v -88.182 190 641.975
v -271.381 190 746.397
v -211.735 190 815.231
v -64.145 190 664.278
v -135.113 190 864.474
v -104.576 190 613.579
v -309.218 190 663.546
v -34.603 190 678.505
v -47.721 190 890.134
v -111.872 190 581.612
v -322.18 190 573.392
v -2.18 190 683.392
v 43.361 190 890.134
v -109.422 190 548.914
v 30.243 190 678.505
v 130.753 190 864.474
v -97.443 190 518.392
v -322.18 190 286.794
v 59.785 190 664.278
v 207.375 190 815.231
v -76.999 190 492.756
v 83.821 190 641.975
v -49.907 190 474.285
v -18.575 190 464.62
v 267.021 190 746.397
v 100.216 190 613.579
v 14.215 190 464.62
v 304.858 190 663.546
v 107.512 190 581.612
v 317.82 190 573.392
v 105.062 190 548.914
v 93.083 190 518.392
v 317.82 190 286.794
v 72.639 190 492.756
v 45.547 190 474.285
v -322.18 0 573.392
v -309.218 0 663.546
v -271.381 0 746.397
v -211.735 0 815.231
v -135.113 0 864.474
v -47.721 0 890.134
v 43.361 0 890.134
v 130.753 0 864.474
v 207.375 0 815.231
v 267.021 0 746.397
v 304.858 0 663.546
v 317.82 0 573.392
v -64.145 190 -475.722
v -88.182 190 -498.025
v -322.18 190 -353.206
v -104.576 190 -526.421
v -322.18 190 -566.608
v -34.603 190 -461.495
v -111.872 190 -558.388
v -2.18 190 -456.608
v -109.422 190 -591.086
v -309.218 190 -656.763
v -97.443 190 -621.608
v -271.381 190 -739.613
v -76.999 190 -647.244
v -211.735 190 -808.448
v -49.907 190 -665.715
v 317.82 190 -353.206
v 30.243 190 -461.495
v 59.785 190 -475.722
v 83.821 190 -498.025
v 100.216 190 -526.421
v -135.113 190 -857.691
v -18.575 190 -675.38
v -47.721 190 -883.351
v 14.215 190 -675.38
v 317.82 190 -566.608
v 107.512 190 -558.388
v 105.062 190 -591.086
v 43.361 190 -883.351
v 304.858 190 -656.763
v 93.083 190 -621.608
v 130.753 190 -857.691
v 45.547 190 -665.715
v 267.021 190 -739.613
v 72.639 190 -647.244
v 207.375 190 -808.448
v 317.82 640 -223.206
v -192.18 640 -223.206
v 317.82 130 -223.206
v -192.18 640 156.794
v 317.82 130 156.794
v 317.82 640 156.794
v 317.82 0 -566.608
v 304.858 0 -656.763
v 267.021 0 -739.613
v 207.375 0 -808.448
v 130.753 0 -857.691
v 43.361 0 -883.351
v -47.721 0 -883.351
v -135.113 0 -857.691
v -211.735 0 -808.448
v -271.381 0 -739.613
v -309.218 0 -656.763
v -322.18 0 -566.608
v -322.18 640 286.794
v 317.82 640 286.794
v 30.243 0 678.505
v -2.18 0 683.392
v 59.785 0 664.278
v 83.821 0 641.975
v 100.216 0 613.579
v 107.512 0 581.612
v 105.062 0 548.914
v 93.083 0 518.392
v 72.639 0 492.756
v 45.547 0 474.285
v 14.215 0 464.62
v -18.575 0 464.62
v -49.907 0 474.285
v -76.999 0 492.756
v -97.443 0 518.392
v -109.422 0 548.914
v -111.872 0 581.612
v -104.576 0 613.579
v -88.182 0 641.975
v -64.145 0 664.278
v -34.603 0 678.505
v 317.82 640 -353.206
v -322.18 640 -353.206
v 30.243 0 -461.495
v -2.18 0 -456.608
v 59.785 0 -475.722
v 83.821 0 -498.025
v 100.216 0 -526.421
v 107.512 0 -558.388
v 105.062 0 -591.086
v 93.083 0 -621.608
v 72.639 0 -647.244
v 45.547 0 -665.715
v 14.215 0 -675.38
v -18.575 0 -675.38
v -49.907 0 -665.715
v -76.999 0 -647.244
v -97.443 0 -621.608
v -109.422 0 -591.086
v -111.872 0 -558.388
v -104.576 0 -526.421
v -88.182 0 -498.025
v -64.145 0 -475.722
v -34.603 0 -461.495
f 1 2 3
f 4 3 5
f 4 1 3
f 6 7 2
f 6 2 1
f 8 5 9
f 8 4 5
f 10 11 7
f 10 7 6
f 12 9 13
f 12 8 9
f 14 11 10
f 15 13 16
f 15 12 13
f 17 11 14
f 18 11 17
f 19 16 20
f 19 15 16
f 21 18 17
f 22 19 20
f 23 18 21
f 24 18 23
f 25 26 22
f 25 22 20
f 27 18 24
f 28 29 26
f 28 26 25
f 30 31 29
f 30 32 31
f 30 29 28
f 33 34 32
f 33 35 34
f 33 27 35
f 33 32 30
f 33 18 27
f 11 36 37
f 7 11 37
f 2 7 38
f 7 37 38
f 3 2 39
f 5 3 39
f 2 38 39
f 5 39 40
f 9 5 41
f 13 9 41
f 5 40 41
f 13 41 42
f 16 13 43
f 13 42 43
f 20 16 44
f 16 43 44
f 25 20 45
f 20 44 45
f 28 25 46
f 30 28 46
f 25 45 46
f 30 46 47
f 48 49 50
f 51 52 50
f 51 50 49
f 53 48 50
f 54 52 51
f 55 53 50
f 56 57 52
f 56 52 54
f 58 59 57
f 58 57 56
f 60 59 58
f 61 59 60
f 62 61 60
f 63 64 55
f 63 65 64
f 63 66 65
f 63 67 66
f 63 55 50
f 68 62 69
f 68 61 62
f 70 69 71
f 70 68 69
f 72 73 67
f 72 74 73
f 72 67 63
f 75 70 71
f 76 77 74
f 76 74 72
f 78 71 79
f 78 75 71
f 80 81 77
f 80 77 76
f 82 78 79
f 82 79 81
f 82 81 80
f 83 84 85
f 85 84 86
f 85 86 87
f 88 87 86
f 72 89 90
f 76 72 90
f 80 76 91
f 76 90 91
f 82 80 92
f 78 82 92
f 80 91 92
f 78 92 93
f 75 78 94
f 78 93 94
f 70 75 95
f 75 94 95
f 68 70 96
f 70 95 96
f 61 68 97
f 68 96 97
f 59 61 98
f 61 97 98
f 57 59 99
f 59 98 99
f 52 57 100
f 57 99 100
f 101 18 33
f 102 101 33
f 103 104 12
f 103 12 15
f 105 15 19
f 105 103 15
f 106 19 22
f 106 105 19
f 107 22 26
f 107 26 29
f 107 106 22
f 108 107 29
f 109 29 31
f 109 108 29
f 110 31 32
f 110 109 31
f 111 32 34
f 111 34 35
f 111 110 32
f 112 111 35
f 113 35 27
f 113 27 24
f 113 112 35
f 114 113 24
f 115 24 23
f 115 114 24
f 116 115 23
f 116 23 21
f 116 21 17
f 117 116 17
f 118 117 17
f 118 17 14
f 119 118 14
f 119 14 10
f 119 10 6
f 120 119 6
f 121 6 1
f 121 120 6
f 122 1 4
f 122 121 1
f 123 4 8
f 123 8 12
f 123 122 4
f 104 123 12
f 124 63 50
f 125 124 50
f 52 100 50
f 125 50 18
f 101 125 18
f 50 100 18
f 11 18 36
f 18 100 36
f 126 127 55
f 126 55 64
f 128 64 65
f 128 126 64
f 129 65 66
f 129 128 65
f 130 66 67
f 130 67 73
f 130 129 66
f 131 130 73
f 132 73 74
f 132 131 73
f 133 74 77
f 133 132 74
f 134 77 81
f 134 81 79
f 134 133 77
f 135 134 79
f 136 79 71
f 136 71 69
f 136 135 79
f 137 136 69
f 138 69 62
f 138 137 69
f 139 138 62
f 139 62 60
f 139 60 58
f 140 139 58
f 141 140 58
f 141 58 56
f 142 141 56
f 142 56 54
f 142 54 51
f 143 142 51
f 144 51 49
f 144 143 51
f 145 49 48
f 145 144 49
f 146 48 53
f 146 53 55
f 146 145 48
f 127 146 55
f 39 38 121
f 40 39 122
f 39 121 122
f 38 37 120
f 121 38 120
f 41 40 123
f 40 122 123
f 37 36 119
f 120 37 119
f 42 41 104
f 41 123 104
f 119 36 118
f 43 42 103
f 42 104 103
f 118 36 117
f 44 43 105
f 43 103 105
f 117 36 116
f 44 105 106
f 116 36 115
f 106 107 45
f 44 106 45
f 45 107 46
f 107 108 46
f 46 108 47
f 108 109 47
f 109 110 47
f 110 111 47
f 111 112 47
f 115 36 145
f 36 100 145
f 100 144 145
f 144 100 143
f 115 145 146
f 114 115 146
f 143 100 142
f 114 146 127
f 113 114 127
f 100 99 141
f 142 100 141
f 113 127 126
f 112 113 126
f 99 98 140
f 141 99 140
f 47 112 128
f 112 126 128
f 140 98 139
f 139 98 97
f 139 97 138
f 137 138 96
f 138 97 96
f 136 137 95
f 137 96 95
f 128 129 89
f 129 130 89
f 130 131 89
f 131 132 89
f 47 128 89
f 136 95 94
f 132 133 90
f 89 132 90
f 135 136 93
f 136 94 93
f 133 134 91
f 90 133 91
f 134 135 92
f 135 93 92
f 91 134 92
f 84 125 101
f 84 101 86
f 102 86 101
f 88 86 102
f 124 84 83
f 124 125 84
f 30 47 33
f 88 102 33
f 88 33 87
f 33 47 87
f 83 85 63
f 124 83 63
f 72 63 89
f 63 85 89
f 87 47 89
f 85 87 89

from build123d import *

# Parameters (mm, degrees)
SKETCH2_R             = 110
BOSS_EXTRUDE8_DEPTH   = 190
BOSS_EXTRUDE8_2_DEPTH = 190
BOSS_EXTRUDE9_DEPTH   = 640
SKETCH2_14_W          = 510.000000001
SKETCH2_14_H          = 380
BOSS_EXTRUDE10_DEPTH  = 130
BOSS_EXTRUDE11_REACH  = 1328.721


with BuildPart() as part:
    # Sketch2 → Boss-Extrude8 (new body)
    with BuildSketch(Plane(origin=(0, 0, 0), x_dir=(1, 0, 0), z_dir=(0, 1, 0))):
        with BuildLine():
            ThreePointArc((317.819938748, 566.60839198), (-2.180061253, 886.60839198), (-322.180061253, 566.60839198))
            Line((-322.180061253, 566.60839198), (-322.180061253, 353.205761503))
            Line((-322.180061253, 353.205761503), (317.819938748, 353.205761503))
            Line((317.819938748, 353.205761503), (317.819938748, 566.60839198))
        make_face()
        with Locations((-2.180061253, 566.60839198)):
            Circle(SKETCH2_R, mode=Mode.SUBTRACT)
    extrude(amount=BOSS_EXTRUDE8_DEPTH)



with BuildPart() as body_2:
    # Sketch2 → Boss-Extrude8 2 (new body)
    with BuildSketch(Plane(origin=(0, 0, 0), x_dir=(1, 0, 0), z_dir=(0, 1, 0))):
        with BuildLine():
            Line((317.819938748, -286.794238497), (-322.180061253, -286.794238497))
            Line((-322.180061253, -286.794238497), (-322.180061253, -573.39160802))
            ThreePointArc((-322.180061253, -573.39160802), (-2.180061253, -893.39160802), (317.819938748, -573.39160802))
            Line((317.819938748, -573.39160802), (317.819938748, -286.794238497))
        make_face()
        with Locations((-2.180061253, -573.39160802)):
            Circle(SKETCH2_R, mode=Mode.SUBTRACT)
    extrude(amount=BOSS_EXTRUDE8_2_DEPTH)


with BuildPart() as part_1:
    add(part.part)

    add(body_2.part)  # Boss-Extrude9 merges body 2
    # Sketch2<13> → Boss-Extrude9 (add)
    with BuildSketch(Plane(origin=(0, 0, 0), x_dir=(1, 0, 0), z_dir=(0, 1, 0))):
        Polygon((317.819938748, 353.205761503), (-322.180061253, 353.205761503), (-322.180061253, -286.794238497), (317.819938748, -286.794238497), (317.819938748, -156.794238497), (-192.180061253, -156.794238497), (-192.180061253, 223.205761503), (317.819938748, 223.205761503), align=None)
    extrude(amount=BOSS_EXTRUDE9_DEPTH)

    # Sketch2<14> → Boss-Extrude10 (add)
    with BuildSketch(Plane(origin=(0, 0, 0), x_dir=(1, 0, 0), z_dir=(0, 1, 0))):
        with Locations((62.819938748, 33.205761503)):
            Rectangle(SKETCH2_14_W, SKETCH2_14_H)
    extrude(amount=BOSS_EXTRUDE10_DEPTH)

    # Sketch13 → Boss-Extrude11 (add, up to next)
    with BuildSketch(Plane.XY.offset(-223.205761503), mode=Mode.PRIVATE) as boss_extrude11_sk1:
        Polygon((-192.180061253, 640), (317.819938748, 130), (-192.180061253, 130), align=None)
    boss_extrude11_tool1 = extrude(boss_extrude11_sk1.sketch, amount=BOSS_EXTRUDE11_REACH, mode=Mode.PRIVATE) - part_1.part
    add(boss_extrude11_tool1.solids().sort_by_distance((-22.180061, 300, -223.205762))[0])


solid = part_1.part
